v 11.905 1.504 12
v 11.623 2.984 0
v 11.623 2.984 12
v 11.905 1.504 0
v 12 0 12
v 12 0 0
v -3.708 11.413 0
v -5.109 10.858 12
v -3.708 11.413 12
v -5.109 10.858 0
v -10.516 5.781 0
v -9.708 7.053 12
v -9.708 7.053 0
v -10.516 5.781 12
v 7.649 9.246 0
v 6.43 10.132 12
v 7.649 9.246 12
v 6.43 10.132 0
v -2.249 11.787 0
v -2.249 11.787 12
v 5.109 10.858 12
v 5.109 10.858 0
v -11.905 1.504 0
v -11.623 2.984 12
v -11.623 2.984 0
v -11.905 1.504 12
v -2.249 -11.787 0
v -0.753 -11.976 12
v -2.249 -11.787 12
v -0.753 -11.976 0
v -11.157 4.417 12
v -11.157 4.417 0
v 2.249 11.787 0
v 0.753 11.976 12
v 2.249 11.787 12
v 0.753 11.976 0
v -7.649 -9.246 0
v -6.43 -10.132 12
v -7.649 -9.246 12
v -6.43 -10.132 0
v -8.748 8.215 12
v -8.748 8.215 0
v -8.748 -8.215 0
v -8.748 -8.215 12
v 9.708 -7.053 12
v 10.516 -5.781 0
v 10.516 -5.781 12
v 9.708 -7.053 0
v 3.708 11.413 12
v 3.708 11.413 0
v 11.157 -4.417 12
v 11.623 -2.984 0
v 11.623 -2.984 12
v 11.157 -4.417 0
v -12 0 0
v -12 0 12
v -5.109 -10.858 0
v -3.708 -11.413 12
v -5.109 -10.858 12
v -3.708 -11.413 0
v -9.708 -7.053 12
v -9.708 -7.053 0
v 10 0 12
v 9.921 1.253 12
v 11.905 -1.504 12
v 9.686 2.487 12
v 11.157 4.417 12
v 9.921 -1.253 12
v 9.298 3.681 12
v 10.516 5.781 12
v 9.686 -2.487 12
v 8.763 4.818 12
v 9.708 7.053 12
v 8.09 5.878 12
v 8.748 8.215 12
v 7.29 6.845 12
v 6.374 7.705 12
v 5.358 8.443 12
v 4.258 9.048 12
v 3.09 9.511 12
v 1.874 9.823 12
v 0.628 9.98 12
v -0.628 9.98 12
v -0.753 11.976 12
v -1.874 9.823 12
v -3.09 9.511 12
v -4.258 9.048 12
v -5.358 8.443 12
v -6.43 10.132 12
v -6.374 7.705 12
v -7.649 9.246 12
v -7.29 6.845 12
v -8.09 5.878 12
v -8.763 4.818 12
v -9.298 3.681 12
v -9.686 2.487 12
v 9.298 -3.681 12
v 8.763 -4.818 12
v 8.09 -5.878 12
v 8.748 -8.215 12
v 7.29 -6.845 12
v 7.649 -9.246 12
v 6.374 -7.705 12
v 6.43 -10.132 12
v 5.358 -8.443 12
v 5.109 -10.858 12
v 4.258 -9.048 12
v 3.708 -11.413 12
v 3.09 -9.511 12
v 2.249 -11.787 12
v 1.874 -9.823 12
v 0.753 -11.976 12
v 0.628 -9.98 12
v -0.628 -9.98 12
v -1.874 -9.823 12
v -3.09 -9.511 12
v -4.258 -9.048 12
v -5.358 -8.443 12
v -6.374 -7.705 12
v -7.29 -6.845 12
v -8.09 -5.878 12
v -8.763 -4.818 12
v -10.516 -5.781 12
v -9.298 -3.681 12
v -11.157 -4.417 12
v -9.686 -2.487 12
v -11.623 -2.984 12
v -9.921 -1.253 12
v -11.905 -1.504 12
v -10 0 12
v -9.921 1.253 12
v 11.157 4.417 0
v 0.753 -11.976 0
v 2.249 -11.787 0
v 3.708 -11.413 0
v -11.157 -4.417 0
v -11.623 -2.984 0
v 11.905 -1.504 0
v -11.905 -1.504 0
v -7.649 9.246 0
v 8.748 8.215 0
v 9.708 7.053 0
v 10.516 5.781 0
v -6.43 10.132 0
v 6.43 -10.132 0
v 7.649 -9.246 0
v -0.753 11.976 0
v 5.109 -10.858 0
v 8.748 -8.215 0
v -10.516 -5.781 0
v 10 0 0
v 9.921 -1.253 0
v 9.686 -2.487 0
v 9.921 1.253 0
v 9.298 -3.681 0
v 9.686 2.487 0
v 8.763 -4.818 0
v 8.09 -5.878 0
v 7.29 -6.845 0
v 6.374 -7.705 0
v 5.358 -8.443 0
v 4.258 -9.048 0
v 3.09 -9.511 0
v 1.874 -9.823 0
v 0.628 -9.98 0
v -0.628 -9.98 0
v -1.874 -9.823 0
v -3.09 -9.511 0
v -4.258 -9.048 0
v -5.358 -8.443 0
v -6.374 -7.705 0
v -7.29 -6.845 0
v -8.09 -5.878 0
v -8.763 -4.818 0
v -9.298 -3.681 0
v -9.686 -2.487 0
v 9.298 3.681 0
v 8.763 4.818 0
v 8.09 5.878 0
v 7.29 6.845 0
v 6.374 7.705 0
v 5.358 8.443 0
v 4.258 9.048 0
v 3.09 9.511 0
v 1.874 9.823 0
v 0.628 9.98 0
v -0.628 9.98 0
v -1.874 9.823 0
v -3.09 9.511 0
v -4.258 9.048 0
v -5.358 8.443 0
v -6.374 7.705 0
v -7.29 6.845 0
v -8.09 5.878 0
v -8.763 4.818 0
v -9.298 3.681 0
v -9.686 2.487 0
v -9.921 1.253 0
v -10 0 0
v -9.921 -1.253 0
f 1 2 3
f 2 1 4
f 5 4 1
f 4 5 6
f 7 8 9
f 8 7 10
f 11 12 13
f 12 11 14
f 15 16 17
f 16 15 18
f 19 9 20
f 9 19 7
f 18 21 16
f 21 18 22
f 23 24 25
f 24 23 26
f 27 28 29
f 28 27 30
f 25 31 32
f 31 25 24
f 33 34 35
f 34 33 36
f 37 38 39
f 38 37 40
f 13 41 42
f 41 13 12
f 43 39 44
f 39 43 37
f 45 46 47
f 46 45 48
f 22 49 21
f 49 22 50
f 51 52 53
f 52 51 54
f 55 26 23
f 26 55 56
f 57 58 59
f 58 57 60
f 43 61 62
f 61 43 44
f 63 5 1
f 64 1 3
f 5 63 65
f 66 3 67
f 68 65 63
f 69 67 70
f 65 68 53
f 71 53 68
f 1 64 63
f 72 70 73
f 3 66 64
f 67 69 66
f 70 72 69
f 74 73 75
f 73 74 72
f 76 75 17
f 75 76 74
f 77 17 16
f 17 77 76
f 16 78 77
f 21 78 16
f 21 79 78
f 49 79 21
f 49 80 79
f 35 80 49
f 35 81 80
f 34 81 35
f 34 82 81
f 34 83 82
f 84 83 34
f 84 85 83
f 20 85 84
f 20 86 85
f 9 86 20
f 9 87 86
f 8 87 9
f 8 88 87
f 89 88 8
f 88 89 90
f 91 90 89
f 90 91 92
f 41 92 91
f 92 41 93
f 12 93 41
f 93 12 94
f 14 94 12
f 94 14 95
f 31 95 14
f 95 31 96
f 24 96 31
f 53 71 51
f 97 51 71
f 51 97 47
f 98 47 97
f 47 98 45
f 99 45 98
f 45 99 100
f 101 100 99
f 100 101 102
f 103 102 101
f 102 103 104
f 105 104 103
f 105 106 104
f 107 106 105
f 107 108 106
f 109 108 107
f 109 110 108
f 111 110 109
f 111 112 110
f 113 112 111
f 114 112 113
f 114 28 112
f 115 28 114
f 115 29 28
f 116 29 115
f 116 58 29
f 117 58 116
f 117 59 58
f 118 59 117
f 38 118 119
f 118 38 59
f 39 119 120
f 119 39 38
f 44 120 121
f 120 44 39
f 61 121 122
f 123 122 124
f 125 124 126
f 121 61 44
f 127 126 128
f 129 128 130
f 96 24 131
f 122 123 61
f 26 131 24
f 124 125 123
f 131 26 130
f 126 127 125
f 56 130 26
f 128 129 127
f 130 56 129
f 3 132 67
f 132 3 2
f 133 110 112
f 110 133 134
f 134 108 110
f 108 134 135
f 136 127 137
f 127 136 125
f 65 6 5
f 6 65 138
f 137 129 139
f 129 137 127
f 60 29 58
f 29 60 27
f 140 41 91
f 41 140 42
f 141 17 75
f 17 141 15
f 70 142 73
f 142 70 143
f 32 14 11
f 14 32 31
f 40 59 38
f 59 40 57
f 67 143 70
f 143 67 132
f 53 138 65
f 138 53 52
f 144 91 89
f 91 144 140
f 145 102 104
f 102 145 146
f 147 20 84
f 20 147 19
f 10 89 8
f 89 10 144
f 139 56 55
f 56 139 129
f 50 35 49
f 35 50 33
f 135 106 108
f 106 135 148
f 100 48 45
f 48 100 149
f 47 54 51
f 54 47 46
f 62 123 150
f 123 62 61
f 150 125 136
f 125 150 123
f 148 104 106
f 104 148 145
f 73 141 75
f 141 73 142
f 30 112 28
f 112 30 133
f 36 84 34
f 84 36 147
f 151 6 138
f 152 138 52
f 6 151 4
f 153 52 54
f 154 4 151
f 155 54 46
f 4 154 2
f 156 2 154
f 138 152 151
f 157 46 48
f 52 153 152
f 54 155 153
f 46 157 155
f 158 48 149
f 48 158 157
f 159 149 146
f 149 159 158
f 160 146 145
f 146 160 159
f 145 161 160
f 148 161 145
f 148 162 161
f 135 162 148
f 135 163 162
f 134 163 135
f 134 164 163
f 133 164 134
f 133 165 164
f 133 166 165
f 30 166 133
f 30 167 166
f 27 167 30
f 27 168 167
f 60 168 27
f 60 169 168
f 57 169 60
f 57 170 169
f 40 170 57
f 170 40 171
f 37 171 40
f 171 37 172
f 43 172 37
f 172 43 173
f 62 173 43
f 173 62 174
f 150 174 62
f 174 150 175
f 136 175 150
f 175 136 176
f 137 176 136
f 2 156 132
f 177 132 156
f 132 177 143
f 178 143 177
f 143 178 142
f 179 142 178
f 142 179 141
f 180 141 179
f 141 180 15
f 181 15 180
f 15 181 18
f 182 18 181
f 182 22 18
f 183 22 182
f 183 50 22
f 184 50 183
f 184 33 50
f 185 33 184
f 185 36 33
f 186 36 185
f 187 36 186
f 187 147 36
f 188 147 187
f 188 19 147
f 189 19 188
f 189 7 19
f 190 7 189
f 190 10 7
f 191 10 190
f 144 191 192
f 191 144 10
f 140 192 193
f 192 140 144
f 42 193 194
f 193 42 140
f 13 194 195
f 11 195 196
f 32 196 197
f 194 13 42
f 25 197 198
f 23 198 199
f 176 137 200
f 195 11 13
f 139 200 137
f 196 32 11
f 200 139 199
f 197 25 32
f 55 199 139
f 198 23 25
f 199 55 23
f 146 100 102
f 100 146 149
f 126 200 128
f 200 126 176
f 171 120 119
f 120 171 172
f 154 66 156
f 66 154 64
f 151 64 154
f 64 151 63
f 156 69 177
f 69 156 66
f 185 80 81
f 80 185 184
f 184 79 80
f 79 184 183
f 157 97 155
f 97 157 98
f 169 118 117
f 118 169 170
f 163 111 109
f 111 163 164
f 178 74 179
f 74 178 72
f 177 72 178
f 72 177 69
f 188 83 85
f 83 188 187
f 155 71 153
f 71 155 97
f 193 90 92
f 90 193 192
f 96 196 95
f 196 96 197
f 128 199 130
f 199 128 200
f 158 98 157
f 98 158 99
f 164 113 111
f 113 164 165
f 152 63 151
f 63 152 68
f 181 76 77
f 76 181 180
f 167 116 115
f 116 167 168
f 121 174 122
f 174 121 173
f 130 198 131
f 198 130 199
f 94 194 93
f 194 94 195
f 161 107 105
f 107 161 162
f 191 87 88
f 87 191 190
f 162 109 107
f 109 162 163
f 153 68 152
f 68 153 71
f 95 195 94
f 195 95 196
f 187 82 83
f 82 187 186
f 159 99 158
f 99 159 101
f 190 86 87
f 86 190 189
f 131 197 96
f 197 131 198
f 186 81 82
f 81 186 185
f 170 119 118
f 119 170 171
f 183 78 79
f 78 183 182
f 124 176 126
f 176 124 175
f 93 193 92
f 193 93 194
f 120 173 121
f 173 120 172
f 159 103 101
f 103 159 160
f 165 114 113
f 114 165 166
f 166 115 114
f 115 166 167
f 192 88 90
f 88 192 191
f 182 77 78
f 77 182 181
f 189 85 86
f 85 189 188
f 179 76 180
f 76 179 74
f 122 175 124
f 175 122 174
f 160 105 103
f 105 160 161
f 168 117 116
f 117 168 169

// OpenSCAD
$fn = 50;

difference() {
	union() {
		translate(v = [0, 0, 0]) {
			rotate(a = [0, 0, 0]) {
				difference() {
					union() {
						cylinder(h = 12, r = 12);
					}
					union() {
						cylinder(h = 12, r = 10);
					}
				}
			}
		}
	}
	union();
}
